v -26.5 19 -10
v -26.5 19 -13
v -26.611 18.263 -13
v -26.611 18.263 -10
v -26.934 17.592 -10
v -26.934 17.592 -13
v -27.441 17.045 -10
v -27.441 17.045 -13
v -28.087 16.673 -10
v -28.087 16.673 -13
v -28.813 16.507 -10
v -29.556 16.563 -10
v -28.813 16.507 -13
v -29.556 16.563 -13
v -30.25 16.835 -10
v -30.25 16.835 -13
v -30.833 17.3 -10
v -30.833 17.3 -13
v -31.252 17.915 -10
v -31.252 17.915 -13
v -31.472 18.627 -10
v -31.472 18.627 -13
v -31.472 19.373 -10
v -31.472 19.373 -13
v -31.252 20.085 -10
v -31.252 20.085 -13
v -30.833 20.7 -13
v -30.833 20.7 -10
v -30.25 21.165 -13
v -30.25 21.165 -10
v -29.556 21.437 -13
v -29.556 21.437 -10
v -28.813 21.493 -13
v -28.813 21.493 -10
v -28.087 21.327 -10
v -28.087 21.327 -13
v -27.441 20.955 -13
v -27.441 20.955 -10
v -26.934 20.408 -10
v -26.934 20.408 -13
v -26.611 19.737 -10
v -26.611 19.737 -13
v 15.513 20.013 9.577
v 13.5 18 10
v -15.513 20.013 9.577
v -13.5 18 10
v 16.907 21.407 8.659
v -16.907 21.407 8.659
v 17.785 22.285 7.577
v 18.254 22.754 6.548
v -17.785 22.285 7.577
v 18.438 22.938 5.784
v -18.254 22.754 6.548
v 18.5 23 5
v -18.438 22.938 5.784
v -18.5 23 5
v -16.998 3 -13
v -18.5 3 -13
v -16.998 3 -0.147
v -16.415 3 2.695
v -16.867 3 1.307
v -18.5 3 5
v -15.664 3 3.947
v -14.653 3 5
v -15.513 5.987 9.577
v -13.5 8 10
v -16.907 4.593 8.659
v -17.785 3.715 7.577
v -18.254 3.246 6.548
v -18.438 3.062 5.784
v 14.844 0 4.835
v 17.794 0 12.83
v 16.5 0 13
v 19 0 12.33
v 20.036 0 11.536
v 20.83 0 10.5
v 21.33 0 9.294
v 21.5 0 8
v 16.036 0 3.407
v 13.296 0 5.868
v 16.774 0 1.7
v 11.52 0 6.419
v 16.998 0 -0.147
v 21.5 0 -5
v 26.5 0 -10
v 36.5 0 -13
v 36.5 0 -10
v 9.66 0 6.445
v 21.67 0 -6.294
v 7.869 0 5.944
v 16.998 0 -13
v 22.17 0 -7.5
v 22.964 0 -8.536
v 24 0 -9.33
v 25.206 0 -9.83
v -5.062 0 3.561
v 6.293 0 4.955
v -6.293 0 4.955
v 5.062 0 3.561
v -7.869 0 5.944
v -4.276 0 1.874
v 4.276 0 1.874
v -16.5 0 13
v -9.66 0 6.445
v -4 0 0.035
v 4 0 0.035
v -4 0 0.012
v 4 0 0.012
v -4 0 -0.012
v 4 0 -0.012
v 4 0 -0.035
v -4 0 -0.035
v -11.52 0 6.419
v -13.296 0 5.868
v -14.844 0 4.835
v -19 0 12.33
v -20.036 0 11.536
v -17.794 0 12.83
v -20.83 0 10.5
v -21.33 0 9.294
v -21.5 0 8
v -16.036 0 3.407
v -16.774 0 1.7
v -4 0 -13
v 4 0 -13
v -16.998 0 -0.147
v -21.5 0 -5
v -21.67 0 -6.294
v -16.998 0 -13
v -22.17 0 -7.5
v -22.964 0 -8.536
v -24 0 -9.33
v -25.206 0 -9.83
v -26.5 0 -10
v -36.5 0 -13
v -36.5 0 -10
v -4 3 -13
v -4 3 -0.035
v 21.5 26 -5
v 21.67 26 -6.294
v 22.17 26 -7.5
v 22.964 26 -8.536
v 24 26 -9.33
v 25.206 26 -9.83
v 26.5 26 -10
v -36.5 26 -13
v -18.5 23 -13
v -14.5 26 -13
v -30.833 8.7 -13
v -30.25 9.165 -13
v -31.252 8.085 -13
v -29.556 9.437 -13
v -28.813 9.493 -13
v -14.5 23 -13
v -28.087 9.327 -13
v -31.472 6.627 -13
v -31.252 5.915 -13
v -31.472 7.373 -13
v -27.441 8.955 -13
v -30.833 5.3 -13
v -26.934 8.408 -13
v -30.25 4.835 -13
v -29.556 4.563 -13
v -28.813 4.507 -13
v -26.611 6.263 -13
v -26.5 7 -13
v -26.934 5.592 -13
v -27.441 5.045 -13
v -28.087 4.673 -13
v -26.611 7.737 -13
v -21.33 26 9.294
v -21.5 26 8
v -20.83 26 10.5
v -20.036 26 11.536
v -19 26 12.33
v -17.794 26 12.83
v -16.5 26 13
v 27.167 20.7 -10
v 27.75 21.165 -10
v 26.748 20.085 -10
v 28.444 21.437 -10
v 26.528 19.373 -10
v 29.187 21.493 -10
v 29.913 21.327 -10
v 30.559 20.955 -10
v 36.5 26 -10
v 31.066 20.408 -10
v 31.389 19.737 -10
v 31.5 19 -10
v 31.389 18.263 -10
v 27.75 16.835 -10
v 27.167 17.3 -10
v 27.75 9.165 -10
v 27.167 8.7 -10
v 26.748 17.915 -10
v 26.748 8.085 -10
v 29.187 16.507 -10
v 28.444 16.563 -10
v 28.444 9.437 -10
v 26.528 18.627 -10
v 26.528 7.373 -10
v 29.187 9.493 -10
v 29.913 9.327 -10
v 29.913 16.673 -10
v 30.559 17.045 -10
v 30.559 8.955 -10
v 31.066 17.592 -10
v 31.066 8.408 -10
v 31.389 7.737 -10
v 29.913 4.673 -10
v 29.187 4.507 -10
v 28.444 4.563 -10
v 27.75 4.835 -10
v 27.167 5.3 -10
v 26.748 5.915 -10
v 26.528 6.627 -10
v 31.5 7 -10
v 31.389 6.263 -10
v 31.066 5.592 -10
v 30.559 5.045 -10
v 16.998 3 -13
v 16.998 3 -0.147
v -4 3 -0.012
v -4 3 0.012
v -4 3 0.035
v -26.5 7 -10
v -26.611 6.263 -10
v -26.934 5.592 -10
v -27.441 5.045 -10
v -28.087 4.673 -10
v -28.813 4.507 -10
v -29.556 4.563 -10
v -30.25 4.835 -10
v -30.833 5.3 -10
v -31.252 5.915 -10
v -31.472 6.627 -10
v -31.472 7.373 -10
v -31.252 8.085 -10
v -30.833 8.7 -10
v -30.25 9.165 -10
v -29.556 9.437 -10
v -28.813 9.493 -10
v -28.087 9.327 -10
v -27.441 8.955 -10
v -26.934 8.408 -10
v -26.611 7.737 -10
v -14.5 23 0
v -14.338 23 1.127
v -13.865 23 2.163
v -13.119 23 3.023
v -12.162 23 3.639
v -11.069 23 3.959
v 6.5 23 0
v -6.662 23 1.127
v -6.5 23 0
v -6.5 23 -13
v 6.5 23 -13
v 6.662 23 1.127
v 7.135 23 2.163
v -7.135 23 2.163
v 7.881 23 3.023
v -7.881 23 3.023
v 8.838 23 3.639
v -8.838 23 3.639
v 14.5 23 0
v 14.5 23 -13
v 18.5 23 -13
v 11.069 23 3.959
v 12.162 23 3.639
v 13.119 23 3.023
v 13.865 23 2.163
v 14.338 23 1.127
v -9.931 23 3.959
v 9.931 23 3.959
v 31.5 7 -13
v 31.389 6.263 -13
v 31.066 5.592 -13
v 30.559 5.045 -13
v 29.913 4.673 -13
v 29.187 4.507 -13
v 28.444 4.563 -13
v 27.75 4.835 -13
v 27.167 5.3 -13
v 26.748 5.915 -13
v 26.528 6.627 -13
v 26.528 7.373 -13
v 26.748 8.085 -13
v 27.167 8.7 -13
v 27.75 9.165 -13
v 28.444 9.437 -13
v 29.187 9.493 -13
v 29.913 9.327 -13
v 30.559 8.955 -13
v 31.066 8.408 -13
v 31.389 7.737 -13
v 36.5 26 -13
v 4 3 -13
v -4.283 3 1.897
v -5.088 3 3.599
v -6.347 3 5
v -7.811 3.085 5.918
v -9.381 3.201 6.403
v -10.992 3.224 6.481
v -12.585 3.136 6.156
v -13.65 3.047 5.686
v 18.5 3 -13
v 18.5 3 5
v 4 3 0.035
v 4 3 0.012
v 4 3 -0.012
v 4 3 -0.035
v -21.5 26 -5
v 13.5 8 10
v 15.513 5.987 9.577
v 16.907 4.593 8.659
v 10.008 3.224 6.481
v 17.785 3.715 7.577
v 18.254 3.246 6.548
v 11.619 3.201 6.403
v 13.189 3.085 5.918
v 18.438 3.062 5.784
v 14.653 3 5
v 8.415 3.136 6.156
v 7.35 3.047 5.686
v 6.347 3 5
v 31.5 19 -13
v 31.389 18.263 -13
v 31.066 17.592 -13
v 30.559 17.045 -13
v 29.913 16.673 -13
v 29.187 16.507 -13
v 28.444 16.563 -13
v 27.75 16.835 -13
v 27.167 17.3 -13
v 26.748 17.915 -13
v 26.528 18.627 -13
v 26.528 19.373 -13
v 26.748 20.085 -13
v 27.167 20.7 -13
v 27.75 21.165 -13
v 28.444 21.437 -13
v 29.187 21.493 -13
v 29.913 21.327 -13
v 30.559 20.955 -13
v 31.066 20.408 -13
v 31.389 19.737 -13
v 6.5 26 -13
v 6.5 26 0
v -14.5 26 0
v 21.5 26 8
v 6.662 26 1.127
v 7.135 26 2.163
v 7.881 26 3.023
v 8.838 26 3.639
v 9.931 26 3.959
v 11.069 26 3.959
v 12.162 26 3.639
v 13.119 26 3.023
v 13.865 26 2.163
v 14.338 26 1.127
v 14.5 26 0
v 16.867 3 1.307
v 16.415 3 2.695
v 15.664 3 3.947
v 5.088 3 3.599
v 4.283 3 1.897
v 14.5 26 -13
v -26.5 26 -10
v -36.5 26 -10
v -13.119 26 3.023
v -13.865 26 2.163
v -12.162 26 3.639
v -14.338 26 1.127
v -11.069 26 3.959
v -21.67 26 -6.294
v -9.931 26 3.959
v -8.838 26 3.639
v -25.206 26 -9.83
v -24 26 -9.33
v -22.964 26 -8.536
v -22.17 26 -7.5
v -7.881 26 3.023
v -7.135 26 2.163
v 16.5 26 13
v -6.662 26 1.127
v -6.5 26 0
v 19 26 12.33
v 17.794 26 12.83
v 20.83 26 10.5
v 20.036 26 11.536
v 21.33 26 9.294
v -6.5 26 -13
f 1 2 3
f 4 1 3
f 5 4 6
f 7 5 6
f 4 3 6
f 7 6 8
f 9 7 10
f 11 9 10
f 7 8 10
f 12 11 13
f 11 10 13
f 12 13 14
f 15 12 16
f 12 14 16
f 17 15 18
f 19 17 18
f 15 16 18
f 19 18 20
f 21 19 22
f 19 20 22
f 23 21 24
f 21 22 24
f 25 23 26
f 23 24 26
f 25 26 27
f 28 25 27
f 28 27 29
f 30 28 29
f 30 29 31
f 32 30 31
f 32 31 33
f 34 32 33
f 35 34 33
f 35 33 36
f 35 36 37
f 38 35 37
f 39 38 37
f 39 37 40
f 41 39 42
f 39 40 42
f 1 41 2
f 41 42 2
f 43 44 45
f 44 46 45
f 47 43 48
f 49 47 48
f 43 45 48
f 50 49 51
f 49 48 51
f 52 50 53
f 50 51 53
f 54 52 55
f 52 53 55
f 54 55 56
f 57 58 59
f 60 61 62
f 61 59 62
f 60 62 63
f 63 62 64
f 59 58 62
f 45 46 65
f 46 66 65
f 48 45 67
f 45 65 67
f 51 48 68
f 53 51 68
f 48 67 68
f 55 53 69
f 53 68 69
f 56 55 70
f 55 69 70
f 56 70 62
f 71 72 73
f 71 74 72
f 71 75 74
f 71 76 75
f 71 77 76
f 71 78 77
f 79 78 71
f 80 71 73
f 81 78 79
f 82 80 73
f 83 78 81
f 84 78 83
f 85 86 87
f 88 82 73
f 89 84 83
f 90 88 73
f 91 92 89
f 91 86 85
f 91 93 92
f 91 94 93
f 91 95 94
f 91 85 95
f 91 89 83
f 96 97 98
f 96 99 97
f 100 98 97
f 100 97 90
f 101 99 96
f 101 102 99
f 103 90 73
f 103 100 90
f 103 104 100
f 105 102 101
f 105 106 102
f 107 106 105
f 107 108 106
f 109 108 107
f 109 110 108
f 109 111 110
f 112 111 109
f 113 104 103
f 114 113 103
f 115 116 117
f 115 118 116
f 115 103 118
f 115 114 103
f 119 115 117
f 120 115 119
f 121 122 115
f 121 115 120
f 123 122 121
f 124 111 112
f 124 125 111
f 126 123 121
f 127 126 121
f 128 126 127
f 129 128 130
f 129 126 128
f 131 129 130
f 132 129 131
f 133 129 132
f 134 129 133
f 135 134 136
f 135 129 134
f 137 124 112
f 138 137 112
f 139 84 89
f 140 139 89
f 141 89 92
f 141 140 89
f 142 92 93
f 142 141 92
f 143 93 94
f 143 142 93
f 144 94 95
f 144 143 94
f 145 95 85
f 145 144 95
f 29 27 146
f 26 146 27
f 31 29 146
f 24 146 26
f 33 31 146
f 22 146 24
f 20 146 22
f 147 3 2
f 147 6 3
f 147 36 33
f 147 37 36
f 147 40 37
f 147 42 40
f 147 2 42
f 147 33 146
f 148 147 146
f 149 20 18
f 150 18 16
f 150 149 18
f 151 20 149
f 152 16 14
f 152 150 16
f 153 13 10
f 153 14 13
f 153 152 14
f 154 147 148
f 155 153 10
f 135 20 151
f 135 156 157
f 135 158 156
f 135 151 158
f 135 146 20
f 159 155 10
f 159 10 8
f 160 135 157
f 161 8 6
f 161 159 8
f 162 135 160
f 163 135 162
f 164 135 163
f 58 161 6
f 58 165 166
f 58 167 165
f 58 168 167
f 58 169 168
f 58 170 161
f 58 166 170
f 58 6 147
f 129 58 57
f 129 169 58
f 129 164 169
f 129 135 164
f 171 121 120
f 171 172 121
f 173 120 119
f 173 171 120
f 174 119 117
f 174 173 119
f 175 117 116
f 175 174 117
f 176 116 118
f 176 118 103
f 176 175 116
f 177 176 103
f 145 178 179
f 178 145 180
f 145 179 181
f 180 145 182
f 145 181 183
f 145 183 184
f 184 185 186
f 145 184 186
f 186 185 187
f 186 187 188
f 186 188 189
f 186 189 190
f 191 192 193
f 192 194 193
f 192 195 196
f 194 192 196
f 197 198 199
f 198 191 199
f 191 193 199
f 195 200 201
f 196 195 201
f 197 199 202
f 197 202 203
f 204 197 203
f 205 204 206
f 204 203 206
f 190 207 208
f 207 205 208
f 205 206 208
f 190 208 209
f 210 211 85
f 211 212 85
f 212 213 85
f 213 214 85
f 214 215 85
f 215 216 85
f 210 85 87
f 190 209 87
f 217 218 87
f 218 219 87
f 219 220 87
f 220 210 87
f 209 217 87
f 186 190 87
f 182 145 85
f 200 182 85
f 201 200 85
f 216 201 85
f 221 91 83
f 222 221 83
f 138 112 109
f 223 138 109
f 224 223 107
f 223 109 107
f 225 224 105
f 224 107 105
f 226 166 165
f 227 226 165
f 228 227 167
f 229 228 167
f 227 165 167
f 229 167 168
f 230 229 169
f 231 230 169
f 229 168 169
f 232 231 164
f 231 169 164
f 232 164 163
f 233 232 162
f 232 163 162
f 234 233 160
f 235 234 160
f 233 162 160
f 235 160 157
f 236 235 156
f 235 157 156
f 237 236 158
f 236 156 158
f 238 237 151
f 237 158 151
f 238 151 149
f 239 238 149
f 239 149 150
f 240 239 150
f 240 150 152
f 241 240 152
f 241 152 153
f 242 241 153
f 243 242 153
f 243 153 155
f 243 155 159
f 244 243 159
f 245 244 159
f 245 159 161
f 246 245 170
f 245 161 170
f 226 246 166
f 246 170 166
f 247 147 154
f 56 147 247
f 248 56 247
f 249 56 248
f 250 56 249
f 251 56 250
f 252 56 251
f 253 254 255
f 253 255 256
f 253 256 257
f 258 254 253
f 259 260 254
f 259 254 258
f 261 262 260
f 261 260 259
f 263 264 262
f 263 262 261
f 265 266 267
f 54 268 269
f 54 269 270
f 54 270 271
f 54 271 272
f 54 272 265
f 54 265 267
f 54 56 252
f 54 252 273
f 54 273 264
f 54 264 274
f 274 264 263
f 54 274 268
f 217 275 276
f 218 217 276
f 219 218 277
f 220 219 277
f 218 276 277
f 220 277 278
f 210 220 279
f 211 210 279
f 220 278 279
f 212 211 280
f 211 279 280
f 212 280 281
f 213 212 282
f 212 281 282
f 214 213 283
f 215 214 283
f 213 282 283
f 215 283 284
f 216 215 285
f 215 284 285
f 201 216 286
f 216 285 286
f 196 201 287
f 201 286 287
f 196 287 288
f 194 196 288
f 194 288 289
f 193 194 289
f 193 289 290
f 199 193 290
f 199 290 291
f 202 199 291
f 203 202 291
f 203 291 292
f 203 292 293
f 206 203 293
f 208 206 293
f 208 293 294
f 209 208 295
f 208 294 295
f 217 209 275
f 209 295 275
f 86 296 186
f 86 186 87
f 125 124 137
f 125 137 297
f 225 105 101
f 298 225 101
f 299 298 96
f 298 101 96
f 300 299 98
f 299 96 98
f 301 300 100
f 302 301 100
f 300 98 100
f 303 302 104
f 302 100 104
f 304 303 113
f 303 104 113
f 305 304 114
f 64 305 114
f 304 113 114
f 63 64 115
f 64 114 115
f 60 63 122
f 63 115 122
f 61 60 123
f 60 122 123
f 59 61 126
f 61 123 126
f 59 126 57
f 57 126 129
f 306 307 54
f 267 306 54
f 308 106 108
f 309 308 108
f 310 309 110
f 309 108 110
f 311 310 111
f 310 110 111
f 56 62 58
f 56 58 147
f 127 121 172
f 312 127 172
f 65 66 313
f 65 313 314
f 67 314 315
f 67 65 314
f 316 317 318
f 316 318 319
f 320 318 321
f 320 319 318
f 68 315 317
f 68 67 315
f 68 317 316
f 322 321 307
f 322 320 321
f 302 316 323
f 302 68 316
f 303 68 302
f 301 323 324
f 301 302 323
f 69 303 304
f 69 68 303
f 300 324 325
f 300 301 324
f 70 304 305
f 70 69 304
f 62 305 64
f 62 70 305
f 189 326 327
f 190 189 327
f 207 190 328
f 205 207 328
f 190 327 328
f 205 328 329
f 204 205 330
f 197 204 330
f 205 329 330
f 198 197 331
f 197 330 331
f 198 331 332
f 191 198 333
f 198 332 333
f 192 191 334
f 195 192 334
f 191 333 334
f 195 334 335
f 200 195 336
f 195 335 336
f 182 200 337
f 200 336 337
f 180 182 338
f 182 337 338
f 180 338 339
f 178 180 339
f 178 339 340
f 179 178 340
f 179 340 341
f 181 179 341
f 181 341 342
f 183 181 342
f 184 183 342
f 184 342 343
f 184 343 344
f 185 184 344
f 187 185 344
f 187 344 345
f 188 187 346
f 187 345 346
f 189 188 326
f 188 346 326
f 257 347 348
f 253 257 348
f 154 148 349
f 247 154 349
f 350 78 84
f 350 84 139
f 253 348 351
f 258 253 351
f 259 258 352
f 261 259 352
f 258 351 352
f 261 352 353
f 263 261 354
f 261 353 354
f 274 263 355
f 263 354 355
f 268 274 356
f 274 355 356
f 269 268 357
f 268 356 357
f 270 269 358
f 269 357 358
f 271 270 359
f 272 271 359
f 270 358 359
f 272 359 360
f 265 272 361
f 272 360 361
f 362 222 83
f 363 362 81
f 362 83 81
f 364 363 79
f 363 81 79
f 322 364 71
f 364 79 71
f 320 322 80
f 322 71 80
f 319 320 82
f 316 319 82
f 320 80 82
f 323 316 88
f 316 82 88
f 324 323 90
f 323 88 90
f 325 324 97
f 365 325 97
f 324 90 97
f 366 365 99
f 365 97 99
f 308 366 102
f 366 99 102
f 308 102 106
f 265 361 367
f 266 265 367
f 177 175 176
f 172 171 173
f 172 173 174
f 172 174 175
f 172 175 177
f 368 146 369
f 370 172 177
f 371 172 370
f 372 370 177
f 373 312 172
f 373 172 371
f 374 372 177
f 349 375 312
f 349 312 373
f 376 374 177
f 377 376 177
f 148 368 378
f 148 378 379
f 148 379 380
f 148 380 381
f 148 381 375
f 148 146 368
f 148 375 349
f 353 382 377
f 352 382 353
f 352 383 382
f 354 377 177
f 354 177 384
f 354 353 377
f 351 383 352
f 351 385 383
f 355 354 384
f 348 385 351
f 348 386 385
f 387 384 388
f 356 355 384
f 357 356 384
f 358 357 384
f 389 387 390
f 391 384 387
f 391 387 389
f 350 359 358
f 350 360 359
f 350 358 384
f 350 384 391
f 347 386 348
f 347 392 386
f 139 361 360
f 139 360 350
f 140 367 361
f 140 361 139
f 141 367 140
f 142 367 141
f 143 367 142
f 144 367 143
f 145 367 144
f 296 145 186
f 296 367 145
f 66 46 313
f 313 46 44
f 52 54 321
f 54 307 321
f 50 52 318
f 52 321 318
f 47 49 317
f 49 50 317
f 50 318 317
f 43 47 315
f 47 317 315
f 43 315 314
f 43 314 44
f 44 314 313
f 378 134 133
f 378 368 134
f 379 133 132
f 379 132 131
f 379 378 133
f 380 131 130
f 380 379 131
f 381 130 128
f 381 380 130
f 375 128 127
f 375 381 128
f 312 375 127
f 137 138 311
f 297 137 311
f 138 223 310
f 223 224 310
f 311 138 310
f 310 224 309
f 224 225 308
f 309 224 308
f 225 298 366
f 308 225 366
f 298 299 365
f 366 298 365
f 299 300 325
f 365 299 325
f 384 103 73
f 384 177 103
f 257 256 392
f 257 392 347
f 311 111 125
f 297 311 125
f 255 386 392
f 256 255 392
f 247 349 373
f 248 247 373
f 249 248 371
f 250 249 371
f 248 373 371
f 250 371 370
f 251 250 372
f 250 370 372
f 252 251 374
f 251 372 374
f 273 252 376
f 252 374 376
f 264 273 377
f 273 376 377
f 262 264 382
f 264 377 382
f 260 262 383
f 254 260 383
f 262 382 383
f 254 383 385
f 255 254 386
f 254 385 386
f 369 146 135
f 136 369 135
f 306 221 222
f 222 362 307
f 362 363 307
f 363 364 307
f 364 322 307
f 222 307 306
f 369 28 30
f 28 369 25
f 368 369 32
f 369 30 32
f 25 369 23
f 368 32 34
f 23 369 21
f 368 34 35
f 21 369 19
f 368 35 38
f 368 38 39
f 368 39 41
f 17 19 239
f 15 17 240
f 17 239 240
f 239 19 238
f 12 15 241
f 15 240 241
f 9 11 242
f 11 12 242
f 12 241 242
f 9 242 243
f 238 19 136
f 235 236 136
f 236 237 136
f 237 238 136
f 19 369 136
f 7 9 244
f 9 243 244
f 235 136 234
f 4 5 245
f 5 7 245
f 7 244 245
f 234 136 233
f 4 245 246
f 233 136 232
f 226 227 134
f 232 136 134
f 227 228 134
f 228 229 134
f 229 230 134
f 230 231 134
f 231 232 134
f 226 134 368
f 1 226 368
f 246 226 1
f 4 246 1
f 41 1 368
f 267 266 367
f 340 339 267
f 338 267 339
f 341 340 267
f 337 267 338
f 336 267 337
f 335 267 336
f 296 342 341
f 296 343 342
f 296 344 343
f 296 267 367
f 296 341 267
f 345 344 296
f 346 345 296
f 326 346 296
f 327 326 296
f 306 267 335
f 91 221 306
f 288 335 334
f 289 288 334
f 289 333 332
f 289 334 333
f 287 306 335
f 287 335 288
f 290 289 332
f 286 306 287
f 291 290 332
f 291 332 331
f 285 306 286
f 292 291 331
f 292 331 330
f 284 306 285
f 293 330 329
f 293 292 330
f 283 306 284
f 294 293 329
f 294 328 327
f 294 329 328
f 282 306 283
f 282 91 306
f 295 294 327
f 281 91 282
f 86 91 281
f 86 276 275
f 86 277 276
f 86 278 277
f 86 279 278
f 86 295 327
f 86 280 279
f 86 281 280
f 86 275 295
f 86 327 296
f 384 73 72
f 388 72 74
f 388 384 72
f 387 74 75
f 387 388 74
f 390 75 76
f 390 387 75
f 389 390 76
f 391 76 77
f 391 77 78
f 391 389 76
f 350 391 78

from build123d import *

# Parameters (mm, degrees)
F1_W          = 43
F1_H          = 26
F2_DEPTH      = 13
F2_DEPTH_BACK = 13
F3_T          = -3
F5_W          = 15
F5_H          = 26
F5_R          = 2.5
F5_W_2        = 43
F5_W_3        = 37
F5_H_2        = 20
F6_DEPTH      = 3
F7_R          = 4.99999
F9_DEPTH      = 5
F10_DEPTH     = 25


# Not quite as in the source:
# - a fillet or chamfer is up to 0.001 mm smaller than in the source, because OpenCascade refuses the exact size


with BuildPart() as f2:
    # F1 (on Top) → F2 (new body, two sides)
    with BuildSketch(Plane.XY) as f2_sk:
        with Locations((0, 13)):
            Rectangle(F1_W, F1_H)
    extrude(amount=F2_DEPTH)
    extrude(f2_sk.sketch, amount=-F2_DEPTH_BACK)

    # F3
    f3_openings = [f2.faces().sort_by_distance(p)[0] for p in [
        (0, 13, -13),
    ]]
    offset(amount=F3_T, openings=f3_openings)

    # F5 (on face) → F6 (join)
    with BuildSketch(Plane(origin=(0, 0, -13), x_dir=(1, 0, 0), z_dir=(0, 0, -1))):
        with Locations((-29, -13)):
            Rectangle(F5_W, F5_H)
        with Locations((-29, -19)):
            Circle(F5_R, mode=Mode.SUBTRACT)
        with Locations((-29, -7)):
            Circle(F5_R, mode=Mode.SUBTRACT)
        with Locations((0, -13)):
            Rectangle(F5_W_2, F5_H)
        with Locations((0, -13)):
            Rectangle(F5_W_3, F5_H_2, mode=Mode.SUBTRACT)
        with Locations((29, -13)):
            Rectangle(F5_W, F5_H)
        with Locations((29, -19)):
            Circle(F5_R, mode=Mode.SUBTRACT)
        with Locations((29, -7)):
            Circle(F5_R, mode=Mode.SUBTRACT)
    extrude(amount=-F6_DEPTH)

    # F7 (radius 5 in the source; OpenCascade refuses exactly that, so slightly less here)
    f7_edges = [f2.edges().sort_by_distance(p)[0] for p in [
        (-21.5, 13, 13),
        (21.5, 13, 13),
        (-21.5, 13, -10),
        (21.5, 13, -10),
        (0, 23, 10),
        (0, 3, 10),
        (-18.5, 13, 10),
        (18.5, 13, 10),
    ]]
    fillet(f7_edges, radius=F7_R)

    # F8 (on face) → F9 (cut)
    with BuildSketch(Plane.XZ):
        with BuildLine():
            Line((-4.0000936475, -11), (-4.0000936475, -0.0348913798))
            ThreePointArc((-4.0000936475, -0.0348913798), (-4, 0), (-4.0000936475, 0.0348913798))
            ThreePointArc((-4.0000936475, 0.0348913798), (-10.5909716955, 6.499363365), (-16.9983365331, -0.1470452389))
            Line((-16.9983365331, -0.1470452389), (-16.9983365331, -10.9773843356))
            Line((-16.9983365331, -10.9773843356), (-16.9983365331, -13))
            Line((-16.9983365331, -13), (-4.0000936475, -13))
            Line((-4.0000936475, -13), (-4.0000936475, -11))
        make_face()
        with BuildLine():
            ThreePointArc((4.0000936475, 0.0348913798), (4, 0), (4.0000936475, -0.0348913798))
            Line((4.0000936475, -0.0348913798), (4.0000936475, -11))
            Line((4.0000936475, -11), (4.0000936475, -13))
            Line((4.0000936475, -13), (16.9983365331, -13))
            Line((16.9983365331, -13), (16.9983365331, -10.9773843356))
            Line((16.9983365331, -10.9773843356), (16.9983365331, -0.1470452389))
            ThreePointArc((16.9983365331, -0.1470452389), (10.5909716955, 6.499363365), (4.0000936475, 0.0348913798))
        make_face()
    extrude(amount=-F9_DEPTH, mode=Mode.SUBTRACT)

    # F4 (on face) → F10 (cut)
    with BuildSketch(Plane(origin=(0, 26, 0), x_dir=(-1, 0, 0), z_dir=(0, 1, 0))):
        with BuildLine():
            Line((-6.5, -13), (-6.5, 0))
            ThreePointArc((-6.5, 0), (-10.5, 4), (-14.5, 0))
            Line((-14.5, 0), (-14.5, -13))
            Line((-14.5, -13), (-6.5, -13))
        make_face()
        with BuildLine():
            ThreePointArc((14.5, 0), (10.5, 4), (6.5, 0))
            Line((6.5, 0), (6.5, -13))
            Line((6.5, -13), (14.5, -13))
            Line((14.5, -13), (14.5, 0))
        make_face()
    extrude(amount=-F10_DEPTH, mode=Mode.SUBTRACT)


solid = f2.part
